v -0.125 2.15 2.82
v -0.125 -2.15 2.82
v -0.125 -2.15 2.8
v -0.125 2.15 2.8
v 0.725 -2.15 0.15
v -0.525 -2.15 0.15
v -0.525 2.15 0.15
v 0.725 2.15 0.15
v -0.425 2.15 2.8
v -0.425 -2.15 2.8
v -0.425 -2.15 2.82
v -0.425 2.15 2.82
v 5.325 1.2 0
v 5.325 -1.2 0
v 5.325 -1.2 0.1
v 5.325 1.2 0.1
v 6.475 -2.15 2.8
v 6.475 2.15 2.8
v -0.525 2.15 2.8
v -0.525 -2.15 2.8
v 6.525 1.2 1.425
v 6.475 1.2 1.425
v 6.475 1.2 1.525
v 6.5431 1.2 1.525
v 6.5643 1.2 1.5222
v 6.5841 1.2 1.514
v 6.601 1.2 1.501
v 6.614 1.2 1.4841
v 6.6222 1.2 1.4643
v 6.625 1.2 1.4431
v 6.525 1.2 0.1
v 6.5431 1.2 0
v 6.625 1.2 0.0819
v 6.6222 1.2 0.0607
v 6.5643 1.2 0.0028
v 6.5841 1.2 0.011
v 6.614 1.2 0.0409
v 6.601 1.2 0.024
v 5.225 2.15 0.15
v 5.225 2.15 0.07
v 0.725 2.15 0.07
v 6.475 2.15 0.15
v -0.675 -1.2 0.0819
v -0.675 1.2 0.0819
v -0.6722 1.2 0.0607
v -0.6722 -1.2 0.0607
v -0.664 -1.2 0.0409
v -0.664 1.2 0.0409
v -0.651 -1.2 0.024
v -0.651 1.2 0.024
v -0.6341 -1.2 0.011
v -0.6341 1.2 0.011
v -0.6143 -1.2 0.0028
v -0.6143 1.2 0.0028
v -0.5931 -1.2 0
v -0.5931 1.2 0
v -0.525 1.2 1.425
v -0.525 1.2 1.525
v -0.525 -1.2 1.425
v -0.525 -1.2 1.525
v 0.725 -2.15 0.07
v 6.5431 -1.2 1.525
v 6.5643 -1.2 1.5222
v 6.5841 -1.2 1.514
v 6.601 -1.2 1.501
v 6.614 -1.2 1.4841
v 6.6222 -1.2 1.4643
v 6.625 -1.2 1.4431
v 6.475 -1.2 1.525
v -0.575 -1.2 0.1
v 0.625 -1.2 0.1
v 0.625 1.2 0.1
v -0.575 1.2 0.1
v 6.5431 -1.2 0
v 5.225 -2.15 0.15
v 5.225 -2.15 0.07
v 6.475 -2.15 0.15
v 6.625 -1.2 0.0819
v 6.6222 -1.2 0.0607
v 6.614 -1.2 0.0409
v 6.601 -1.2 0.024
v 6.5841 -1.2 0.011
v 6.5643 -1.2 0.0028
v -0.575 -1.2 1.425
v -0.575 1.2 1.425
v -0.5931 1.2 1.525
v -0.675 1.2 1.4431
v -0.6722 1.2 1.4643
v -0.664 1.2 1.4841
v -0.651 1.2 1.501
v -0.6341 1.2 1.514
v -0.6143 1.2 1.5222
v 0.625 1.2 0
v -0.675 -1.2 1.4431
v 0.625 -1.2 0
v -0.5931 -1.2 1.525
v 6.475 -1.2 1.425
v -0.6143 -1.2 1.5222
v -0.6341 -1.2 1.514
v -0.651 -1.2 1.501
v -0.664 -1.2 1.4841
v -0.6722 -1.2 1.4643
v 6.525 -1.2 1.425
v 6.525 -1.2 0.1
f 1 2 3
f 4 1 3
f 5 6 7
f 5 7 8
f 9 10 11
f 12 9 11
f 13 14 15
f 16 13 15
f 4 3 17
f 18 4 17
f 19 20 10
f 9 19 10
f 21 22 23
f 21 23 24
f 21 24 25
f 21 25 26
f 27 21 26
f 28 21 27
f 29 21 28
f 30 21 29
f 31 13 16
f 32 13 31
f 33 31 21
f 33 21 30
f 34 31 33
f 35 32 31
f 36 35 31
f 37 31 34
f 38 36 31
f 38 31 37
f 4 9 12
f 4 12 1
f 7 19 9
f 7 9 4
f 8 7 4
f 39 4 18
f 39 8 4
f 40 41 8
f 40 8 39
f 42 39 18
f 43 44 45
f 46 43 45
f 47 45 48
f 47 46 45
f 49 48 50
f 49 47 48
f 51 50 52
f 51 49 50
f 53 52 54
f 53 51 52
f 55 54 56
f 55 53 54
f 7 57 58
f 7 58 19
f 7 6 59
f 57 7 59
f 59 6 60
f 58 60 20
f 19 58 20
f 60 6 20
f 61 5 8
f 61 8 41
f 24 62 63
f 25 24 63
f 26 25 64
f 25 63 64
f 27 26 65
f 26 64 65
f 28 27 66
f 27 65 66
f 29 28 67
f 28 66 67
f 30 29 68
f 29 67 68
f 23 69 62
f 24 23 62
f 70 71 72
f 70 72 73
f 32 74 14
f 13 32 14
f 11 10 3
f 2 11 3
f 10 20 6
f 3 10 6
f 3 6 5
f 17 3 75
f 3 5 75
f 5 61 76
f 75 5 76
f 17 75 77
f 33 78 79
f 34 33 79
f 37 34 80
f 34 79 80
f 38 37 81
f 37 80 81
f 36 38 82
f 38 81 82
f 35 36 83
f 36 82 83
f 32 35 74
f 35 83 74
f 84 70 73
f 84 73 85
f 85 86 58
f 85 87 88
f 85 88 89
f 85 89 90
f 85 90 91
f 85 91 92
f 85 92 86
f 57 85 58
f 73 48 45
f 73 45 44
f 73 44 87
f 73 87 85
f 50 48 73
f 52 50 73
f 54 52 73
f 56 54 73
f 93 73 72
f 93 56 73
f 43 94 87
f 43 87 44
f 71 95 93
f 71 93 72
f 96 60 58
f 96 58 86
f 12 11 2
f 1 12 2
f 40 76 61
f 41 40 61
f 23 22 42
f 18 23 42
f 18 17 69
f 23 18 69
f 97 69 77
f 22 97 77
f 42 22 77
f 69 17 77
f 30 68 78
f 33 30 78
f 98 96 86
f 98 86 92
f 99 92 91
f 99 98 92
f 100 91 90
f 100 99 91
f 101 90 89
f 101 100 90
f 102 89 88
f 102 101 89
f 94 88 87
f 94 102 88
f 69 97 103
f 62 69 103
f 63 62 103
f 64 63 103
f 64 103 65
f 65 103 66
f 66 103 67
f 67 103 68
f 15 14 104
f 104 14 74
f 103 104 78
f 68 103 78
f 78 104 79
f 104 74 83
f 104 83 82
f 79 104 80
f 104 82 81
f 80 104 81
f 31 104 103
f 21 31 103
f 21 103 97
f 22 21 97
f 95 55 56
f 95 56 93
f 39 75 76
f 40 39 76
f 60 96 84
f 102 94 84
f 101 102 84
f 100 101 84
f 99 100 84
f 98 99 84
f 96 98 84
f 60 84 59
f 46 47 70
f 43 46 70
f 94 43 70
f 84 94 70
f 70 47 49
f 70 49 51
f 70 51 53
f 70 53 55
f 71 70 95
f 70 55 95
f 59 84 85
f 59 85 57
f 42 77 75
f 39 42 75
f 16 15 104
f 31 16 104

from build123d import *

# Parameters (mm, degrees)
SKETCH_1_W          = 7
SKETCH_1_H          = 4.3
EXTRUDE_1_DEPTH     = 2.65
EXTRUDE_2_DEPTH     = 1.2
SKETCH_3_W          = 4.5
SKETCH_3_H          = 4.3
EXTRUDE_2_2_DEPTH   = 0.08
SKETCH_4_W          = 0.3
SKETCH_4_H          = 4.3
EXTRUDE_3_DEPTH     = 0.02
MOVE_START          = -2.15
MOVE_BODY_1_DEPTH   = 4.3
MOVE_BODY_1_2_DEPTH = 0.95
MOVE_START_2        = 1.2
MOVE_BODY_1_3_DEPTH = 0.95
MOVE_BODY_1_4_DEPTH = 4.3
MOVE_START_3        = -1.2
MOVE_BODY_1_5_DEPTH = 2.4


# Read off the part's stored shape, not the designer's step: Тело-Переместить/Копировать1
with BuildPart() as part:
    # Эскиз1 → Бобышка-Вытянуть1 (new body)
    with BuildSketch(Plane.XY):
        Rectangle(SKETCH_1_W, SKETCH_1_H)
    extrude(amount=EXTRUDE_1_DEPTH)

    # Эскиз2 → Extrude 2 (add, symmetric)
    with BuildSketch(Plane(origin=(0, 0, 0), x_dir=(1, 0, 0), z_dir=(0, 1, 0))):
        with BuildLine():
            Line((-3.5, -1.275), (-3.55, -1.275))
            Line((-3.55, -1.275), (-3.55, 0.05))
            Line((-3.55, 0.05), (-2.35, 0.05))
            Line((-2.35, 0.05), (-2.35, 0.15))
            Line((-2.35, 0.15), (-3.568137941, 0.15))
            ThreePointArc((-3.568137941, 0.15), (-3.626023158, 0.126023158), (-3.65, 0.068137941))
            Line((-3.65, 0.068137941), (-3.65, -1.293137941))
            ThreePointArc((-3.65, -1.293137941), (-3.626023158, -1.351023158), (-3.568137941, -1.375))
            Line((-3.568137941, -1.375), (-3.5, -1.375))
            Line((-3.5, -1.375), (-3.5, -1.275))
        make_face()
    extrude_2 = extrude(amount=EXTRUDE_2_DEPTH, both=True)

    # Эскиз3 → Extrude 2 2 (add)
    with BuildSketch(Plane(origin=(0, 0, 0), x_dir=(-1, 0, 0), z_dir=(0, 0, -1))):
        Rectangle(SKETCH_3_W, SKETCH_3_H)
    extrude(amount=EXTRUDE_2_2_DEPTH)

    # Зеркальное отражение1: Extrude 2 across plane
    add(extrude_2.mirror(Plane(origin=(0, 0, 0), x_dir=(0, 0, 1), z_dir=(1, 0, 0))))

    # Эскиз4 → Бобышка-Вытянуть3 (add)
    with BuildSketch(Plane.XY.offset(2.65)):
        with Locations((-3.25, 0)):
            Rectangle(SKETCH_4_W, SKETCH_4_H)
    extrude(amount=EXTRUDE_3_DEPTH)

    # Move Body 1 outline → Move Body 1 (cut)
    with BuildSketch(Plane(origin=(0, 0, 0), x_dir=(1, 0, 0), z_dir=(0, 1, 0)).offset(MOVE_START)):
        with BuildLine():
            Line((-3.1, -2.65), (-0.525, -2.65))
            Line((-0.525, -2.65), (-0.525, -1.525))
            Line((-0.525, -1.525), (-0.593137941, -1.525))
            ThreePointArc((-0.593137941, -1.525), (-0.651023158, -1.501023158), (-0.675, -1.443137941))
            Line((-0.675, -1.443137941), (-0.675, -0.081862059))
            ThreePointArc((-0.675, -0.081862059), (-0.651023158, -0.023976842), (-0.593137941, 0))
            Line((-0.593137941, 0), (0.625, 0))
            Line((0.625, 0), (0.625, -0.1))
            Line((0.625, -0.1), (-0.575, -0.1))
            Line((-0.575, -0.1), (-0.575, -1.425))
            Line((-0.575, -1.425), (-0.525, -1.425))
            Line((-0.525, -1.425), (-0.525, -0.15))
            Line((-0.525, -0.15), (0.725, -0.15))
            Line((0.725, -0.15), (0.725, -0.07))
            Line((0.725, -0.07), (3.5, -0.07))
            Line((3.5, -0.07), (3.5, 0))
            Line((3.5, 0), (2.25, 0))
            Line((2.25, 0), (2.25, 0.08))
            Line((2.25, 0.08), (-2.25, 0.08))
            Line((-2.25, 0.08), (-2.25, 0))
            Line((-2.25, 0), (-3.5, 0))
            Line((-3.5, 0), (-3.5, -1.275))
            Line((-3.5, -1.275), (-3.55, -1.275))
            Line((-3.55, -1.275), (-3.55, 0.05))
            Line((-3.55, 0.05), (-2.35, 0.05))
            Line((-2.35, 0.05), (-2.35, 0.15))
            Line((-2.35, 0.15), (-3.568137941, 0.15))
            ThreePointArc((-3.568137941, 0.15), (-3.626023158, 0.126023158), (-3.65, 0.068137941))
            Line((-3.65, 0.068137941), (-3.65, -1.293137941))
            ThreePointArc((-3.65, -1.293137941), (-3.626023158, -1.351023158), (-3.568137941, -1.375))
            Line((-3.568137941, -1.375), (-3.5, -1.375))
            Line((-3.5, -1.375), (-3.5, -2.65))
            Line((-3.5, -2.65), (-3.4, -2.65))
            Line((-3.4, -2.65), (-3.4, -2.67))
            Line((-3.4, -2.67), (-3.1, -2.67))
            Line((-3.1, -2.67), (-3.1, -2.65))
        make_face()
        with BuildLine():
            Line((3.55, 0.05), (3.55, -0.07))
            Line((3.55, -0.07), (3.65, -0.07))
            Line((3.65, -0.07), (3.65, 0.068137941))
            ThreePointArc((3.65, 0.068137941), (3.626023158, 0.126023158), (3.568137941, 0.15))
            Line((3.568137941, 0.15), (2.35, 0.15))
            Line((2.35, 0.15), (2.35, 0.05))
            Line((2.35, 0.05), (3.55, 0.05))
        make_face()
    extrude(amount=MOVE_BODY_1_DEPTH, mode=Mode.SUBTRACT)

    # Move Body 1 2 outline → Move Body 1 2 (cut)
    with BuildSketch(Plane(origin=(0, 0, 0), x_dir=(1, 0, 0), z_dir=(0, 1, 0)).offset(MOVE_START)):
        with BuildLine():
            Line((-0.593137941, -1.525), (-0.525, -1.525))
            Line((-0.525, -1.525), (-0.525, -1.425))
            Line((-0.525, -1.425), (-0.575, -1.425))
            Line((-0.575, -1.425), (-0.575, -0.1))
            Line((-0.575, -0.1), (0.625, -0.1))
            Line((0.625, -0.1), (0.625, 0))
            Line((0.625, 0), (-0.593137941, 0))
            ThreePointArc((-0.593137941, 0), (-0.651023158, -0.023976842), (-0.675, -0.081862059))
            Line((-0.675, -0.081862059), (-0.675, -1.443137941))
            ThreePointArc((-0.675, -1.443137941), (-0.651023158, -1.501023158), (-0.593137941, -1.525))
        make_face()
    extrude(amount=MOVE_BODY_1_2_DEPTH, mode=Mode.SUBTRACT)

    # Move Body 1 3 outline → Move Body 1 3 (cut)
    with BuildSketch(Plane(origin=(0, 0, 0), x_dir=(1, 0, 0), z_dir=(0, 1, 0)).offset(MOVE_START_2)):
        with BuildLine():
            Line((-0.593137941, -1.525), (-0.525, -1.525))
            Line((-0.525, -1.525), (-0.525, -1.425))
            Line((-0.525, -1.425), (-0.575, -1.425))
            Line((-0.575, -1.425), (-0.575, -0.1))
            Line((-0.575, -0.1), (0.625, -0.1))
            Line((0.625, -0.1), (0.625, 0))
            Line((0.625, 0), (-0.593137941, 0))
            ThreePointArc((-0.593137941, 0), (-0.651023158, -0.023976842), (-0.675, -0.081862059))
            Line((-0.675, -0.081862059), (-0.675, -1.443137941))
            ThreePointArc((-0.675, -1.443137941), (-0.651023158, -1.501023158), (-0.593137941, -1.525))
        make_face()
    extrude(amount=MOVE_BODY_1_3_DEPTH, mode=Mode.SUBTRACT)

    # Move Body 1 4 outline → Move Body 1 4 (add)
    with BuildSketch(Plane(origin=(0, 0, 0), x_dir=(1, 0, 0), z_dir=(0, 1, 0)).offset(MOVE_START)):
        Polygon((-0.525, -2.8), (-0.425, -2.8), (-0.425, -2.82), (-0.125, -2.82), (-0.125, -2.8), (6.475, -2.8), (6.475, -0.15), (5.225, -0.15), (5.225, -0.07), (3.5, -0.07), (3.5, -2.65), (-0.525, -2.65), align=None)
    extrude(amount=MOVE_BODY_1_4_DEPTH)

    # Move Body 1 5 outline → Move Body 1 5 (add)
    with BuildSketch(Plane(origin=(0, 0, 0), x_dir=(1, 0, 0), z_dir=(0, 1, 0)).offset(MOVE_START_3)):
        with BuildLine():
            Line((6.475, -1.425), (6.475, -1.525))
            Line((6.475, -1.525), (6.543137941, -1.525))
            ThreePointArc((6.543137941, -1.525), (6.601023158, -1.501023158), (6.625, -1.443137941))
            Line((6.625, -1.443137941), (6.625, -0.081862059))
            ThreePointArc((6.625, -0.081862059), (6.601023158, -0.023976842), (6.543137941, 0))
            Line((6.543137941, 0), (5.325, 0))
            Line((5.325, 0), (5.325, -0.1))
            Line((5.325, -0.1), (6.525, -0.1))
            Line((6.525, -0.1), (6.525, -1.425))
            Line((6.525, -1.425), (6.475, -1.425))
        make_face()
    extrude(amount=MOVE_BODY_1_5_DEPTH)


solid = part.part
